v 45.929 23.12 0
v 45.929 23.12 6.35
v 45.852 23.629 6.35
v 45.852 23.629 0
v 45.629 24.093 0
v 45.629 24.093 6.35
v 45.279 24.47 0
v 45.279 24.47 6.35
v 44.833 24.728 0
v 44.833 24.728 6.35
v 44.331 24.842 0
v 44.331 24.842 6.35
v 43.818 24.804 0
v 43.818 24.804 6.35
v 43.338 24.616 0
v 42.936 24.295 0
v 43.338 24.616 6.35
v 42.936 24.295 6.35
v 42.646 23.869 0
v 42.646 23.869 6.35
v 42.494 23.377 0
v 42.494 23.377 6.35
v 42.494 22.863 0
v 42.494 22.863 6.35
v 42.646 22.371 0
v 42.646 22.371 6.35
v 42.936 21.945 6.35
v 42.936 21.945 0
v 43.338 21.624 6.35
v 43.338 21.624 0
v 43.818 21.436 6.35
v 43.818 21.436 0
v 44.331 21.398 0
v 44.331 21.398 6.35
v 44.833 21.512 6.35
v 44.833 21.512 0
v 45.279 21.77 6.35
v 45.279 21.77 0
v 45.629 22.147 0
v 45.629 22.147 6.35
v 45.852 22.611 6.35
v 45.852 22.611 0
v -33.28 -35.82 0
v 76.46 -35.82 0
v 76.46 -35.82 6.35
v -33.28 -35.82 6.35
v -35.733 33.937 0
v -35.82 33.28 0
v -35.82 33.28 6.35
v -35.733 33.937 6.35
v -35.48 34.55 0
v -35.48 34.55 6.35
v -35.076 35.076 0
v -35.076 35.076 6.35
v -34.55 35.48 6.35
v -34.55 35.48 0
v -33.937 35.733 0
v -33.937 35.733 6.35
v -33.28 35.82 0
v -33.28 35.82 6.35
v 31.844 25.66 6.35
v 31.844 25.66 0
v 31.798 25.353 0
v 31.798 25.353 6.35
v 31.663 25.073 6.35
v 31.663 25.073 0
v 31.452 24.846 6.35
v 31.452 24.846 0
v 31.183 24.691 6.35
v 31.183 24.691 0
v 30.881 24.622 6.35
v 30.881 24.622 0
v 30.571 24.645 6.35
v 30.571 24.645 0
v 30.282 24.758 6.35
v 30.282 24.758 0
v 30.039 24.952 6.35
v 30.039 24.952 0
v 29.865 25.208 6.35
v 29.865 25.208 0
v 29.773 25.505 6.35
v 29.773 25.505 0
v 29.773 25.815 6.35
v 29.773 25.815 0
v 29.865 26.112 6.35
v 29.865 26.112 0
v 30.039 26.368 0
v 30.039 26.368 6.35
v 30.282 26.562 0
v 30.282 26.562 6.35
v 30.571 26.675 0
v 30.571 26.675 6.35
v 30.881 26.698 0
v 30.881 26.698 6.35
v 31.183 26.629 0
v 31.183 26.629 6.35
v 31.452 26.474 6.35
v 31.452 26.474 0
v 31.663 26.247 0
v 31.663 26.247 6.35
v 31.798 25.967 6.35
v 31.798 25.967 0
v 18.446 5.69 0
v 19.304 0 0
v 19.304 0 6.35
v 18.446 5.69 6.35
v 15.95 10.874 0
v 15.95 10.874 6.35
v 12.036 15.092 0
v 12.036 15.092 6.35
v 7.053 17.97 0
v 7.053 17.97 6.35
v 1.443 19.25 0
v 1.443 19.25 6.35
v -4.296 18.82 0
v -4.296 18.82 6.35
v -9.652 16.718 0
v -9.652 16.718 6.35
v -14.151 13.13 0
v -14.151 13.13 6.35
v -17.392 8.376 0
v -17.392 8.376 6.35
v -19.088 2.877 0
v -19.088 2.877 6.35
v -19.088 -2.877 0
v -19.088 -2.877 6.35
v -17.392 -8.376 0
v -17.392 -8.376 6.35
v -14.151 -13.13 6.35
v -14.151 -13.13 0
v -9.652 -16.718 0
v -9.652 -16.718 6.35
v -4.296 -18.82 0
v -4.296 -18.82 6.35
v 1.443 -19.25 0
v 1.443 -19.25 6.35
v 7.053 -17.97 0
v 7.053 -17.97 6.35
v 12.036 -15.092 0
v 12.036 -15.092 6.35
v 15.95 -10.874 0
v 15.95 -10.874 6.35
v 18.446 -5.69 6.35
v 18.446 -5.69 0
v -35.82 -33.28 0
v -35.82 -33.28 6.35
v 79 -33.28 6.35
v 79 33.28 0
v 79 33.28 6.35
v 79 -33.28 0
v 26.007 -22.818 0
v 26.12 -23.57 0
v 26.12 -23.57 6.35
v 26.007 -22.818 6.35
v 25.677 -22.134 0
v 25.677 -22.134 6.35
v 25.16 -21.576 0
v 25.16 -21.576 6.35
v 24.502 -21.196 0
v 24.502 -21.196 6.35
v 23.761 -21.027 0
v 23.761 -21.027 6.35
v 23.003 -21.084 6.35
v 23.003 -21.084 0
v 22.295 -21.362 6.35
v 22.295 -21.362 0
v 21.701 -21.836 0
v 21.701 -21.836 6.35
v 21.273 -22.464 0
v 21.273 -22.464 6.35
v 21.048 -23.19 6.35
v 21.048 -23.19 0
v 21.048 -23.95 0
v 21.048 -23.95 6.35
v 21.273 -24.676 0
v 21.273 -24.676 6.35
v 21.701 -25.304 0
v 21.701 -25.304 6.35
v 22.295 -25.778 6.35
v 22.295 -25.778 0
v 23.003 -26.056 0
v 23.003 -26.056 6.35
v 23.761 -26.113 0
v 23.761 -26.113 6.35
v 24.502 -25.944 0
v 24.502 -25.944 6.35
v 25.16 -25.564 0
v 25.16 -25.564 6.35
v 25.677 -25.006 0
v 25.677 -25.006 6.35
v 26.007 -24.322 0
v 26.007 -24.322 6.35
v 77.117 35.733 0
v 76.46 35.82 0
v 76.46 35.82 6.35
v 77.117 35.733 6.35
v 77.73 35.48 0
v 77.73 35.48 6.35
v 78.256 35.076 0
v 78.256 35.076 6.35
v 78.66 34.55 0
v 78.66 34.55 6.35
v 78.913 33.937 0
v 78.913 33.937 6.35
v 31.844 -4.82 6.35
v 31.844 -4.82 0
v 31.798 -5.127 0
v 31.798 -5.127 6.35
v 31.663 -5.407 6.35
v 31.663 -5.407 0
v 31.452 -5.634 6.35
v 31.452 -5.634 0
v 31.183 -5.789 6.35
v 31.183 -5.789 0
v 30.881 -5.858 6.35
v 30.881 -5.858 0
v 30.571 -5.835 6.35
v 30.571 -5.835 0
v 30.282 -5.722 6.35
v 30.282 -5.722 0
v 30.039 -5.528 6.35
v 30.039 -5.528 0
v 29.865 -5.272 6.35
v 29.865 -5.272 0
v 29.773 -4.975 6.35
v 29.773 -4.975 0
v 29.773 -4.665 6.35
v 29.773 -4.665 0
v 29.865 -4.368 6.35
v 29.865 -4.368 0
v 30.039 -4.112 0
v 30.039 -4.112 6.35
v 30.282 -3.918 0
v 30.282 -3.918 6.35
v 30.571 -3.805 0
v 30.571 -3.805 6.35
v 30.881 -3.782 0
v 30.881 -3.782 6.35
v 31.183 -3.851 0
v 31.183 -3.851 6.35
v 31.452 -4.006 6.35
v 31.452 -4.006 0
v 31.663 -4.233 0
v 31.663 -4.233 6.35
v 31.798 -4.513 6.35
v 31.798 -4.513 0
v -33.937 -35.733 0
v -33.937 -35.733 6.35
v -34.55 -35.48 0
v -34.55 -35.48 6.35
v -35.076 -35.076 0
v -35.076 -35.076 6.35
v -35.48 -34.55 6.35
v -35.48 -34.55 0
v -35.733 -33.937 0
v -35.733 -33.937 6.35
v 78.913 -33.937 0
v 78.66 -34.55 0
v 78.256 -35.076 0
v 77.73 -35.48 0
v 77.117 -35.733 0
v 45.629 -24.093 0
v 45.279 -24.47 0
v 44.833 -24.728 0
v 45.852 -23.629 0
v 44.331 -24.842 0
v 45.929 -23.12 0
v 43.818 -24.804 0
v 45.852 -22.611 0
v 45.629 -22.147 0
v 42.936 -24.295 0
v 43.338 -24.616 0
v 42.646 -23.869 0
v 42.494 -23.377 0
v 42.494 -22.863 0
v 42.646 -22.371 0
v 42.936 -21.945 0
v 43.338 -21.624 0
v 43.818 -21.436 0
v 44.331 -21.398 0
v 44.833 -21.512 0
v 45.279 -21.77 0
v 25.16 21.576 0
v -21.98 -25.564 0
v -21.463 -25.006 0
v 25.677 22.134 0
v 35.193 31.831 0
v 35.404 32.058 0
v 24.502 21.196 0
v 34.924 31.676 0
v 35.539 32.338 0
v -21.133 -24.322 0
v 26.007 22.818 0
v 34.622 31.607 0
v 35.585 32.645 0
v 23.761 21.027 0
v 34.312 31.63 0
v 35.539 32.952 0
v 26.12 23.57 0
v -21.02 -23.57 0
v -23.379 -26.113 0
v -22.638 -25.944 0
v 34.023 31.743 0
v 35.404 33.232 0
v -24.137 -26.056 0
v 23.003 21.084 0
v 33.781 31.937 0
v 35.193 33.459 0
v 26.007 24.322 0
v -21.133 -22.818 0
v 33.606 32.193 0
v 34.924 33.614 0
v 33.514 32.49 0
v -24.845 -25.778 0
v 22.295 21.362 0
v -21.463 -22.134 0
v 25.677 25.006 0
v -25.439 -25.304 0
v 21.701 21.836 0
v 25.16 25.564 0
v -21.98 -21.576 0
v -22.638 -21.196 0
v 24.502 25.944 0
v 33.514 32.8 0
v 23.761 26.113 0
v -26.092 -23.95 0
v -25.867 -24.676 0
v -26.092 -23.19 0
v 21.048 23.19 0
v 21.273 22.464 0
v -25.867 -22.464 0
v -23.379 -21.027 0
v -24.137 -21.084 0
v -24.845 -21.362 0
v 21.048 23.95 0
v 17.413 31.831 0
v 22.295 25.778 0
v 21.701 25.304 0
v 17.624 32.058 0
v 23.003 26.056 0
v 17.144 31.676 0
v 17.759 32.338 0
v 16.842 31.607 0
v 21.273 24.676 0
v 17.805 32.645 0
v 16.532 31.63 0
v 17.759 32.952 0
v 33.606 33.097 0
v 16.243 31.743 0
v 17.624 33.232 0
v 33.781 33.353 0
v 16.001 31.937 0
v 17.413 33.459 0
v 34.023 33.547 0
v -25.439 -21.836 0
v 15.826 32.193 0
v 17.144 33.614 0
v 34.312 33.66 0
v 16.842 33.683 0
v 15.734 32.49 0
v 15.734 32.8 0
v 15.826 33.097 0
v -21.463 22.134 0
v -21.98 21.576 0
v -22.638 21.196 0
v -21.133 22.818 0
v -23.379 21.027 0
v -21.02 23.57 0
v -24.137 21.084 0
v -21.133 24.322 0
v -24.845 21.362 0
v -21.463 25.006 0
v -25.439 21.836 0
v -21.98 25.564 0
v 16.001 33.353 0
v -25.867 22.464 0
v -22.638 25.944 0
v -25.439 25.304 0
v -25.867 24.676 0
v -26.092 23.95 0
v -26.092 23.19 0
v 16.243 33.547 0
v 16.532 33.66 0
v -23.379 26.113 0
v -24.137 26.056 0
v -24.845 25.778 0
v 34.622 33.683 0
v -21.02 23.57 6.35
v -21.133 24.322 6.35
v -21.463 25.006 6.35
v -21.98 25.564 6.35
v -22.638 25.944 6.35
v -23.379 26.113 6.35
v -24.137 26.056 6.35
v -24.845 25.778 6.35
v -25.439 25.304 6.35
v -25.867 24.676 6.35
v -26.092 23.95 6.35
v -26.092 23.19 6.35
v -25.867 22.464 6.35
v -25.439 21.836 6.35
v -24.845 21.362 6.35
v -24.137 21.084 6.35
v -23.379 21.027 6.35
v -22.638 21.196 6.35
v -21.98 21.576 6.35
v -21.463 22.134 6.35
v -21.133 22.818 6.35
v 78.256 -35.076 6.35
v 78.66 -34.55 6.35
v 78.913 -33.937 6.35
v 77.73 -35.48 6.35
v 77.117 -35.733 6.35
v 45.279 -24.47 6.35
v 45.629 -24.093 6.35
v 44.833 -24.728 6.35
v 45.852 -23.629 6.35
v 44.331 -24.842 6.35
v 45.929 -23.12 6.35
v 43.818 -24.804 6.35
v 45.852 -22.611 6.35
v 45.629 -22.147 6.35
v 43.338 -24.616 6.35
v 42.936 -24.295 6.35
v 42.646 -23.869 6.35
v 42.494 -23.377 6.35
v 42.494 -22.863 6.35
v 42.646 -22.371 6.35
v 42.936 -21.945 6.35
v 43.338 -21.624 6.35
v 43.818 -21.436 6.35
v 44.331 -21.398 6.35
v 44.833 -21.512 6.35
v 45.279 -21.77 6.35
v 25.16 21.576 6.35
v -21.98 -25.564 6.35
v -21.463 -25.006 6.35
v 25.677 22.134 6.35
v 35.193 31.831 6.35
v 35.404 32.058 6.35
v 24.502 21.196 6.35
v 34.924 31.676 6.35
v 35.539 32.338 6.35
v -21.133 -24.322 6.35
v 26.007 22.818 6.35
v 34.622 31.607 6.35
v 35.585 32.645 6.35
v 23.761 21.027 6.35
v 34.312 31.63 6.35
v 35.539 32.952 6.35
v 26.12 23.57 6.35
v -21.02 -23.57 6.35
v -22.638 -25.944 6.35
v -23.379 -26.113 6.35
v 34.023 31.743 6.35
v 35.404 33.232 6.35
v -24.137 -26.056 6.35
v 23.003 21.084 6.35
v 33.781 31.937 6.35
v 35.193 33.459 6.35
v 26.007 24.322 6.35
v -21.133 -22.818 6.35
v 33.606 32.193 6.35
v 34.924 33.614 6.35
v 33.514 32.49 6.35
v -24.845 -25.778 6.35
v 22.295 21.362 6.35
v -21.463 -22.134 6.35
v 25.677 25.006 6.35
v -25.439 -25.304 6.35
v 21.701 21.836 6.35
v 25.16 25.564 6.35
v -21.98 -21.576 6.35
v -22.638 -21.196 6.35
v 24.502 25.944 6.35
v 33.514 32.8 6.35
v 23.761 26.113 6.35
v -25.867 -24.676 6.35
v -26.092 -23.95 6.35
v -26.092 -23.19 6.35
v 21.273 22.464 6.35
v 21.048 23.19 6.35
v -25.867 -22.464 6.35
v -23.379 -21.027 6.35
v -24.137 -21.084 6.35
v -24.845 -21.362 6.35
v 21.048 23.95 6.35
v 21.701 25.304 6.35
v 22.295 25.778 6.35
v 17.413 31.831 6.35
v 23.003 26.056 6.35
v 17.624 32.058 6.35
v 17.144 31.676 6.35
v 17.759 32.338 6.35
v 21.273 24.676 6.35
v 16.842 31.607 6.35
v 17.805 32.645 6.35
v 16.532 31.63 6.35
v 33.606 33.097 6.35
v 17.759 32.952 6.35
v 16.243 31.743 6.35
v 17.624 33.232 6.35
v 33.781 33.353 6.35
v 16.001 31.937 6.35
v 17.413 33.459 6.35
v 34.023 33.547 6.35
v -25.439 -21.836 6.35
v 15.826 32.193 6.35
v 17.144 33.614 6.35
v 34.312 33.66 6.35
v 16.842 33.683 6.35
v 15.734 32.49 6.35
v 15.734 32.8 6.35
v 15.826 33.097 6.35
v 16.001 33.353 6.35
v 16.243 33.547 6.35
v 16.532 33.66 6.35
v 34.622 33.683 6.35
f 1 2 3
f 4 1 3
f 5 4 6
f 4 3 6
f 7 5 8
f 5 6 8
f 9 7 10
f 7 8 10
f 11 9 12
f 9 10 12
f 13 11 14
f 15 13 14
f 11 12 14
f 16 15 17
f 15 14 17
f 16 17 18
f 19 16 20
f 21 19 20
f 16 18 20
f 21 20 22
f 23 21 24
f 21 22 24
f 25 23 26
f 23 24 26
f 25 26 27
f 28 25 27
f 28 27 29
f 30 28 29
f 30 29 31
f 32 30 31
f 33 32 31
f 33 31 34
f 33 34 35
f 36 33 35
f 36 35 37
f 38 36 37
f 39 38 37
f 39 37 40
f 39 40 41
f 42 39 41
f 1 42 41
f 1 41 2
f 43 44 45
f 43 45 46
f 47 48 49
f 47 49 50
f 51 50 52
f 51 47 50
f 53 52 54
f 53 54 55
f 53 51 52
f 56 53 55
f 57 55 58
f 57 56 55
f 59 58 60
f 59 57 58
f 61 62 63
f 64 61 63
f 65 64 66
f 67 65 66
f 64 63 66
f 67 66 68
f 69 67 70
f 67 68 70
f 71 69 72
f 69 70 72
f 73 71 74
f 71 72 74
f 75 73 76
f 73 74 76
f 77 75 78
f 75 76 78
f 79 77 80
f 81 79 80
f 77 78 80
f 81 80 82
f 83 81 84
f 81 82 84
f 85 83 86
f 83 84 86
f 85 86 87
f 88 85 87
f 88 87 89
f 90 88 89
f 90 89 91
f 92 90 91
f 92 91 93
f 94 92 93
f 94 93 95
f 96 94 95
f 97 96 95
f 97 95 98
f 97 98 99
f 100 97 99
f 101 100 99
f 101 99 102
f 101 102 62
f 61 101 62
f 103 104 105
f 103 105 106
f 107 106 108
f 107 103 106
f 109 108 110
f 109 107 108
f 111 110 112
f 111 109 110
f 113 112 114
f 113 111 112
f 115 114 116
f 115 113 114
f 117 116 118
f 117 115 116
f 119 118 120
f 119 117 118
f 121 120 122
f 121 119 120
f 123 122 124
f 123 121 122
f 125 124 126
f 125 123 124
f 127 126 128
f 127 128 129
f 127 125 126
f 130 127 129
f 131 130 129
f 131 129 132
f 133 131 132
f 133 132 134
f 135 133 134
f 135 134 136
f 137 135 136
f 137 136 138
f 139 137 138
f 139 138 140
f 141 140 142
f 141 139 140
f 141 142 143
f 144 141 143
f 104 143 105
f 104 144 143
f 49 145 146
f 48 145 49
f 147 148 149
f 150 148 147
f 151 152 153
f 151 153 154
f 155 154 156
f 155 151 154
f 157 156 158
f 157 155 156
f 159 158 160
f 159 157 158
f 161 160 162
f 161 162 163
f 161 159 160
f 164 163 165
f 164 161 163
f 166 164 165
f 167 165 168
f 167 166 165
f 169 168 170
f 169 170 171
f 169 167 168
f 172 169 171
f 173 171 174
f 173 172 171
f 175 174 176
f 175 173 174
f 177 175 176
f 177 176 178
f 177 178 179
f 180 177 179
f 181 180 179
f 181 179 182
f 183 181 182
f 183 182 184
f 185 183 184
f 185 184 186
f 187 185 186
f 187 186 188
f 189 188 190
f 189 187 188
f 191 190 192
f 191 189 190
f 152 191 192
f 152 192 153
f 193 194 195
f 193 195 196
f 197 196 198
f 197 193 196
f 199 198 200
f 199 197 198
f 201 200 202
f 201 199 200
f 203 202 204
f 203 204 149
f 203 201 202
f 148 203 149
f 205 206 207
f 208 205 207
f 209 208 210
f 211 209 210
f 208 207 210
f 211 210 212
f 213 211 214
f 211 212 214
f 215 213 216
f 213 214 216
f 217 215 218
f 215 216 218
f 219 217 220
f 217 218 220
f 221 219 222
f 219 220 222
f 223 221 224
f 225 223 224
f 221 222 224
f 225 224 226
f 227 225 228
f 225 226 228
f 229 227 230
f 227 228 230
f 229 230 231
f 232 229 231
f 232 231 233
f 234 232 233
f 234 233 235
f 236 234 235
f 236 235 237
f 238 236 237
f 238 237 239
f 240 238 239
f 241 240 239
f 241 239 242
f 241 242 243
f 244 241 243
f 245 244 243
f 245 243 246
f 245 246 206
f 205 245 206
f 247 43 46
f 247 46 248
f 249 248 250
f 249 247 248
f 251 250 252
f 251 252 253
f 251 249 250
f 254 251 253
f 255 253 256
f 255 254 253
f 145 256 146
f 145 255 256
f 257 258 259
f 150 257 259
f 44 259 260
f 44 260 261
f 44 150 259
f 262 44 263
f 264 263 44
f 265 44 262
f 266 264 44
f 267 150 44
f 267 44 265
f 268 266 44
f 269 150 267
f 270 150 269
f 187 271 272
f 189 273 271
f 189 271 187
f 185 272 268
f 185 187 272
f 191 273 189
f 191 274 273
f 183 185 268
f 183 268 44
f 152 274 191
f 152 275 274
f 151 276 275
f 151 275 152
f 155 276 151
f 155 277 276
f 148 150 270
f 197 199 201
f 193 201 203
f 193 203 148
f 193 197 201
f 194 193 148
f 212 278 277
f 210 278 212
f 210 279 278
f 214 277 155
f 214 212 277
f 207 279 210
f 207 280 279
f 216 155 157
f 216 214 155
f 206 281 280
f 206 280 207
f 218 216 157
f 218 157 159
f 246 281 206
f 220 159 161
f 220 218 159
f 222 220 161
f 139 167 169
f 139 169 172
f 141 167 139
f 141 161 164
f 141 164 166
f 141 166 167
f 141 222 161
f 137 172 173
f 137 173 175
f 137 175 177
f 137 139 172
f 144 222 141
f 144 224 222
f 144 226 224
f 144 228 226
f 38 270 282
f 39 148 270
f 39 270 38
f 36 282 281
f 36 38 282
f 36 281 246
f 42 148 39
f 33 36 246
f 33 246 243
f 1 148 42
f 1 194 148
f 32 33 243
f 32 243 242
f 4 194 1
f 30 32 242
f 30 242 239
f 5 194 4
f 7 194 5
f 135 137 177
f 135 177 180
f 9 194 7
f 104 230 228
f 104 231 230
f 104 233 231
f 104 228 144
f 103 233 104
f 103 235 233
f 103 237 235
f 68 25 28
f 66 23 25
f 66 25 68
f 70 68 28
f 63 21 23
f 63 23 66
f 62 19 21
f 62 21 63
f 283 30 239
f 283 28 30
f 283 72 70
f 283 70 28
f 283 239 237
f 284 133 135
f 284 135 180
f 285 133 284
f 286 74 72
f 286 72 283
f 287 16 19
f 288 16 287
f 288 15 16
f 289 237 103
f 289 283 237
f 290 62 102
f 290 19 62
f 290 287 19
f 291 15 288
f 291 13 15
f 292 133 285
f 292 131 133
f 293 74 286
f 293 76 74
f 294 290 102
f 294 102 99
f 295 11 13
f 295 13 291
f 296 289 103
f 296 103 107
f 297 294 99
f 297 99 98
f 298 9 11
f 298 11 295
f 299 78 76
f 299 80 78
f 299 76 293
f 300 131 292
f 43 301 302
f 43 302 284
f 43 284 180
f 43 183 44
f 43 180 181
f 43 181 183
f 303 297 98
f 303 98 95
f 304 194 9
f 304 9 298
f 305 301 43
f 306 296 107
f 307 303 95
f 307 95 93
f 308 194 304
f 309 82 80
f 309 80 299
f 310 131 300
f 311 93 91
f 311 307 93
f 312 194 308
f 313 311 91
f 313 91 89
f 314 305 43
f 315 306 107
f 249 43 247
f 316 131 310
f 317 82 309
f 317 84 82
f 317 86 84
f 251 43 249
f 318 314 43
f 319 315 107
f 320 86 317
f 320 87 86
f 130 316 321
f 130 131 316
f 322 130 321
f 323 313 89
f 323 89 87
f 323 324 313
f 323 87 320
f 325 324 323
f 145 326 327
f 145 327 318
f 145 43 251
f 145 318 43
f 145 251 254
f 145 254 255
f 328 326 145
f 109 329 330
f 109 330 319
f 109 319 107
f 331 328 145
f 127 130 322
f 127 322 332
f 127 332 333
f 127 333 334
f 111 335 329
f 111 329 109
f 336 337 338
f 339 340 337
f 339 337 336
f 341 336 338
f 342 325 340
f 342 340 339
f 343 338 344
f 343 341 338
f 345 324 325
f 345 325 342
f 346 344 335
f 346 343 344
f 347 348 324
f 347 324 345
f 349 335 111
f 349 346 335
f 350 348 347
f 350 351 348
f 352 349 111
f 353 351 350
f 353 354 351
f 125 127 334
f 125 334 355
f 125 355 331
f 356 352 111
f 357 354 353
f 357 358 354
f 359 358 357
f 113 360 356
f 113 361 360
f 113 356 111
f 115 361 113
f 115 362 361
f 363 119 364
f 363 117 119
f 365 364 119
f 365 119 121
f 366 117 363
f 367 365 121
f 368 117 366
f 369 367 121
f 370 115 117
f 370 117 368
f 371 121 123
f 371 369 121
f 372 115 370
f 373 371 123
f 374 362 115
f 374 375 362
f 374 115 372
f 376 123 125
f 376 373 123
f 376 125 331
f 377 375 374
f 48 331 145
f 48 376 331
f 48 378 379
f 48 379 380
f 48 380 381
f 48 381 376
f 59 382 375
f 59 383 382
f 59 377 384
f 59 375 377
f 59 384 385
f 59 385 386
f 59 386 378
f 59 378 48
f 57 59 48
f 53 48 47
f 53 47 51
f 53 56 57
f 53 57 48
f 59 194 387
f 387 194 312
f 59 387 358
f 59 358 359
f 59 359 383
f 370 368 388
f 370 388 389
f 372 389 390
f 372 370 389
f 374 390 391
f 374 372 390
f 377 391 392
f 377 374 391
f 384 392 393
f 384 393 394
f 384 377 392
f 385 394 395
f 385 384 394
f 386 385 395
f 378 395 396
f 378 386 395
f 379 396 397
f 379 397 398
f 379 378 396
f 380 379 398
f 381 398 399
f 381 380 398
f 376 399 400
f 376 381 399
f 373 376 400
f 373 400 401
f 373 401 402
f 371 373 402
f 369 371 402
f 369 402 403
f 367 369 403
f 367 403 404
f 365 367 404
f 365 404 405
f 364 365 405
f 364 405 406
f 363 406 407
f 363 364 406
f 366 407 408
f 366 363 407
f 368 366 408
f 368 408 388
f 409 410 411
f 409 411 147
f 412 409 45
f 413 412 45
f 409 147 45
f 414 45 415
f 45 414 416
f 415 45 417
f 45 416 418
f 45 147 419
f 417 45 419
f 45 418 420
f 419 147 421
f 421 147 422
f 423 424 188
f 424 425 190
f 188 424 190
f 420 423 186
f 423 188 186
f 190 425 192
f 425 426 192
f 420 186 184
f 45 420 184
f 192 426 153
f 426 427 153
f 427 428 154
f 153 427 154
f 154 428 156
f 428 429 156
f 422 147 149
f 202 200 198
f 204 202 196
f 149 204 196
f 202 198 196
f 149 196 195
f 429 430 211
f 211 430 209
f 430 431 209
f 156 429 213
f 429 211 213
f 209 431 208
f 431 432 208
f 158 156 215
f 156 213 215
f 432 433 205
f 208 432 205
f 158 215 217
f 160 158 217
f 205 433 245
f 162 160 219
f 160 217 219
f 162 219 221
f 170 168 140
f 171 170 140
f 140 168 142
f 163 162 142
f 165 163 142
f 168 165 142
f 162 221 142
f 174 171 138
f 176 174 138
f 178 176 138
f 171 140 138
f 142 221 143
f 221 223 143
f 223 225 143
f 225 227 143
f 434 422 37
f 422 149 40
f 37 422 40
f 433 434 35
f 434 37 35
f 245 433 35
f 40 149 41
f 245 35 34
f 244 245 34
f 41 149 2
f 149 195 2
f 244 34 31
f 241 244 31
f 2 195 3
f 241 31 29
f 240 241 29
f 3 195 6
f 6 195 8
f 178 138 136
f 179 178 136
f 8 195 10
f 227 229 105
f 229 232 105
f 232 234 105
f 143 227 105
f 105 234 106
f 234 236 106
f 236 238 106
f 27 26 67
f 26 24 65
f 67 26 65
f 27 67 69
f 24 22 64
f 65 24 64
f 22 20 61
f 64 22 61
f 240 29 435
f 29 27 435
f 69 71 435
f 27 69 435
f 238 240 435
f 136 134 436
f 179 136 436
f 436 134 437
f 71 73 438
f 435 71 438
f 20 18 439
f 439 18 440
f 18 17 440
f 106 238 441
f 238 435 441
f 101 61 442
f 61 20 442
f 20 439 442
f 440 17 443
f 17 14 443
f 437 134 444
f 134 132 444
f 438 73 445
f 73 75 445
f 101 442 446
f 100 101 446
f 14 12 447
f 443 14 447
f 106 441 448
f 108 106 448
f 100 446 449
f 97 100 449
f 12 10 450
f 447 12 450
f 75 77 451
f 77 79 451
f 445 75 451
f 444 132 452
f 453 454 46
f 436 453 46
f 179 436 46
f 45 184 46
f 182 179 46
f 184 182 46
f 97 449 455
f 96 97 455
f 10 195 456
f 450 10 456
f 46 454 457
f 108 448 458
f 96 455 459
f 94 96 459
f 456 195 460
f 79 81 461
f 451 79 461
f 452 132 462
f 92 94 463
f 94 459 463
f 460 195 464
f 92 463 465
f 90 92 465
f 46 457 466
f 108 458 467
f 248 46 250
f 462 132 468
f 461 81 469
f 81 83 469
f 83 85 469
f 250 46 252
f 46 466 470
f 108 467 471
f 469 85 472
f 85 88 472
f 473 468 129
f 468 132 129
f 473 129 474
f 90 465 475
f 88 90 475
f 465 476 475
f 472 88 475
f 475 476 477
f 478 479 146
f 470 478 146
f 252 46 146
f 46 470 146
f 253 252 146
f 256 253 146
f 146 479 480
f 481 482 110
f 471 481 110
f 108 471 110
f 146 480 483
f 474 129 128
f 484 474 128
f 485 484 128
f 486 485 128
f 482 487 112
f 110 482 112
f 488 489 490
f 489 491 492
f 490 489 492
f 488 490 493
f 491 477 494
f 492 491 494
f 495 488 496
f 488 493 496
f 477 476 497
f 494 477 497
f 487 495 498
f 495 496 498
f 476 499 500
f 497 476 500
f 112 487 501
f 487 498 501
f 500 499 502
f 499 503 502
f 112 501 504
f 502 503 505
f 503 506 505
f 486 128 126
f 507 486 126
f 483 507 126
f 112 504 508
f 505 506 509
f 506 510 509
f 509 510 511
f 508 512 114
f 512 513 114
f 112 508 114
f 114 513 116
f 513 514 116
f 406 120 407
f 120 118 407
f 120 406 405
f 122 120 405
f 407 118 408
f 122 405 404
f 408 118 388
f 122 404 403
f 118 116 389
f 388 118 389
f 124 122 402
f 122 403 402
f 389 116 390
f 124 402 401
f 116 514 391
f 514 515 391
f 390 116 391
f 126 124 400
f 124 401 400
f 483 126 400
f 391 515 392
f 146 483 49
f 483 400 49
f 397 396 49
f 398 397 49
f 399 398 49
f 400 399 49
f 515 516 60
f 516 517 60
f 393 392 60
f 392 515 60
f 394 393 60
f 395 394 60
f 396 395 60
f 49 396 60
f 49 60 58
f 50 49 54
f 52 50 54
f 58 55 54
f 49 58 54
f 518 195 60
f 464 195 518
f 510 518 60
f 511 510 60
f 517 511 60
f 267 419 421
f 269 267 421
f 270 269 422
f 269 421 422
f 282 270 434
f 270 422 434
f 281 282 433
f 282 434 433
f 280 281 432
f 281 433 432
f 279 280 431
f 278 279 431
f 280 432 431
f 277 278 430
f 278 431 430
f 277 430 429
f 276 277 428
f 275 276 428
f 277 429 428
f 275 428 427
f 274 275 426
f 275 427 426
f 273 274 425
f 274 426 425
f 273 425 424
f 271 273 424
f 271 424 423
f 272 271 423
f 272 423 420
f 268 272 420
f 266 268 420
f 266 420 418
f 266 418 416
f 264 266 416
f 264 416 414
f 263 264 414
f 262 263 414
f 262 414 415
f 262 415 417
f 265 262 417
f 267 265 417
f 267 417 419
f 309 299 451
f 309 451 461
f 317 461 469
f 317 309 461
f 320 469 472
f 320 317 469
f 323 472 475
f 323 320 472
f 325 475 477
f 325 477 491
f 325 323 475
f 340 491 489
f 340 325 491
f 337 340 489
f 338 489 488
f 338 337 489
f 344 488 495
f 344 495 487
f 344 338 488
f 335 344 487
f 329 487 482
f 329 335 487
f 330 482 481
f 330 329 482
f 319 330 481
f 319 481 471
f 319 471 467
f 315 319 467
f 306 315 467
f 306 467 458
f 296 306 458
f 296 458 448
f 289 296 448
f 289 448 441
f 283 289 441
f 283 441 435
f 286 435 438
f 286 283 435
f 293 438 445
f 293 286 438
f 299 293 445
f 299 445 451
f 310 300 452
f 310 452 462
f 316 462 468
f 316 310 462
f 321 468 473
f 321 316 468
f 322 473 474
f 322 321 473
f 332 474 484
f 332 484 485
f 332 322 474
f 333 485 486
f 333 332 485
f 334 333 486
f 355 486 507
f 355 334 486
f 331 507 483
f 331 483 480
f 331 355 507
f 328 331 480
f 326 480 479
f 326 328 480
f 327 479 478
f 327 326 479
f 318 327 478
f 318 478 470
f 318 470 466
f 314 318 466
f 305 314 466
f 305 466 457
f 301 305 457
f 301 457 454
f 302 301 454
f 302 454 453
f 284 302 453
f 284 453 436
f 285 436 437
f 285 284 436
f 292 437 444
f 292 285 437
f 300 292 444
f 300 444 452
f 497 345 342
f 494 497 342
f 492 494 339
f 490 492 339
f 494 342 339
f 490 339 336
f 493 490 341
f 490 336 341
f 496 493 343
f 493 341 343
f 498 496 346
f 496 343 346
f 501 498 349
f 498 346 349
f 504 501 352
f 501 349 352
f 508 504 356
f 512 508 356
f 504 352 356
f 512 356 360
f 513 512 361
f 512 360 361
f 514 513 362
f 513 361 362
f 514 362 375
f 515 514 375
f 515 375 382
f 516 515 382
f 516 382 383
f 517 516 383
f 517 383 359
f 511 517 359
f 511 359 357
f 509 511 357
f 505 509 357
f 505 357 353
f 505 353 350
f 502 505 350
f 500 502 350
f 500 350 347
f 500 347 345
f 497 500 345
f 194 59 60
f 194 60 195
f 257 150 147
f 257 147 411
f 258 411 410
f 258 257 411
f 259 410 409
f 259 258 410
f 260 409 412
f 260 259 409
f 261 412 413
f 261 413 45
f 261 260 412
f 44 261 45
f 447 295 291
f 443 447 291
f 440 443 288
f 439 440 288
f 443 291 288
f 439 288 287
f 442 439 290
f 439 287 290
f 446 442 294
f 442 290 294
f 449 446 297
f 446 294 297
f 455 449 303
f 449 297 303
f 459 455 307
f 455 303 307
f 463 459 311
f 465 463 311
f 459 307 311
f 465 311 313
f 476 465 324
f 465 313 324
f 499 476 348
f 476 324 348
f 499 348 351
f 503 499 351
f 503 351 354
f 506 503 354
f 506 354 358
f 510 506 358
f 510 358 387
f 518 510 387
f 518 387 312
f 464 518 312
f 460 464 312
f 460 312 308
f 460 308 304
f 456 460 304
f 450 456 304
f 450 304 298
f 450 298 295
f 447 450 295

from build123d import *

# Parameters (mm, degrees)
SKETCH3_R                     = 19.304
SKETCH3_R_2                   = 2.55
BOSS_EXTRUDE1_DEPTH           = 6.35
TAP_DRILL_FOR_3_56_TAP1_D     = 2.0828
TAP_DRILL_FOR_3_56_TAP1_DEPTH = 7.62
TAP_DRILL_FOR_3_56_TAP1_TIP   = 0.625736249
TAP_DRILL_FOR_8_32_TAP2_D     = 3.4544


with BuildPart() as part:
    # Sketch3 → Boss-Extrude1 (new body)
    with BuildSketch(Plane.XY):
        with BuildLine():
            Line((-33.28, 35.82), (76.46, 35.82))
            ThreePointArc((76.46, 35.82), (78.256051224, 35.076051224), (79, 33.28))
            Line((79, 33.28), (79, -33.28))
            ThreePointArc((79, -33.28), (78.256051224, -35.076051224), (76.46, -35.82))
            Line((76.46, -35.82), (-33.28, -35.82))
            ThreePointArc((-33.28, -35.82), (-35.076051224, -35.076051224), (-35.82, -33.28))
            Line((-35.82, -33.28), (-35.82, 33.28))
            ThreePointArc((-35.82, 33.28), (-35.076051224, 35.076051224), (-33.28, 35.82))
        make_face()
        Circle(SKETCH3_R, mode=Mode.SUBTRACT)
        with Locations((23.57, 23.57)):
            Circle(SKETCH3_R_2, mode=Mode.SUBTRACT)
        with Locations((-23.57, 23.57)):
            Circle(SKETCH3_R_2, mode=Mode.SUBTRACT)
        with Locations((-23.57, -23.57)):
            Circle(SKETCH3_R_2, mode=Mode.SUBTRACT)
        with Locations((23.57, -23.57)):
            Circle(SKETCH3_R_2, mode=Mode.SUBTRACT)
    extrude(amount=BOSS_EXTRUDE1_DEPTH)

    # Tap Drill for #3-56 Tap1
    with Locations(Plane(origin=(0, 0, 6.35), x_dir=(-1, 0, 0), z_dir=(0, 0, 1))):
        with Locations((-30.8029, 4.82), (-34.544, -32.645), (-16.764, -32.645), (-30.8029, -25.66)):
            Hole(TAP_DRILL_FOR_3_56_TAP1_D / 2, depth=TAP_DRILL_FOR_3_56_TAP1_DEPTH)
            with Locations((0, 0, -(TAP_DRILL_FOR_3_56_TAP1_DEPTH + TAP_DRILL_FOR_3_56_TAP1_TIP / 2))):  # 118° drill point
                Cone(0, TAP_DRILL_FOR_3_56_TAP1_D / 2, TAP_DRILL_FOR_3_56_TAP1_TIP, mode=Mode.SUBTRACT)

    # Tap Drill for #8-32 Tap2 (through all)
    with Locations(Plane(origin=(0, 0, 0), x_dir=(-1, 0, 0), z_dir=(0, 0, -1))):
        with Locations((-44.202, 23.12), (-44.202, -23.12)):
            Hole(TAP_DRILL_FOR_8_32_TAP2_D / 2)


solid = part.part
